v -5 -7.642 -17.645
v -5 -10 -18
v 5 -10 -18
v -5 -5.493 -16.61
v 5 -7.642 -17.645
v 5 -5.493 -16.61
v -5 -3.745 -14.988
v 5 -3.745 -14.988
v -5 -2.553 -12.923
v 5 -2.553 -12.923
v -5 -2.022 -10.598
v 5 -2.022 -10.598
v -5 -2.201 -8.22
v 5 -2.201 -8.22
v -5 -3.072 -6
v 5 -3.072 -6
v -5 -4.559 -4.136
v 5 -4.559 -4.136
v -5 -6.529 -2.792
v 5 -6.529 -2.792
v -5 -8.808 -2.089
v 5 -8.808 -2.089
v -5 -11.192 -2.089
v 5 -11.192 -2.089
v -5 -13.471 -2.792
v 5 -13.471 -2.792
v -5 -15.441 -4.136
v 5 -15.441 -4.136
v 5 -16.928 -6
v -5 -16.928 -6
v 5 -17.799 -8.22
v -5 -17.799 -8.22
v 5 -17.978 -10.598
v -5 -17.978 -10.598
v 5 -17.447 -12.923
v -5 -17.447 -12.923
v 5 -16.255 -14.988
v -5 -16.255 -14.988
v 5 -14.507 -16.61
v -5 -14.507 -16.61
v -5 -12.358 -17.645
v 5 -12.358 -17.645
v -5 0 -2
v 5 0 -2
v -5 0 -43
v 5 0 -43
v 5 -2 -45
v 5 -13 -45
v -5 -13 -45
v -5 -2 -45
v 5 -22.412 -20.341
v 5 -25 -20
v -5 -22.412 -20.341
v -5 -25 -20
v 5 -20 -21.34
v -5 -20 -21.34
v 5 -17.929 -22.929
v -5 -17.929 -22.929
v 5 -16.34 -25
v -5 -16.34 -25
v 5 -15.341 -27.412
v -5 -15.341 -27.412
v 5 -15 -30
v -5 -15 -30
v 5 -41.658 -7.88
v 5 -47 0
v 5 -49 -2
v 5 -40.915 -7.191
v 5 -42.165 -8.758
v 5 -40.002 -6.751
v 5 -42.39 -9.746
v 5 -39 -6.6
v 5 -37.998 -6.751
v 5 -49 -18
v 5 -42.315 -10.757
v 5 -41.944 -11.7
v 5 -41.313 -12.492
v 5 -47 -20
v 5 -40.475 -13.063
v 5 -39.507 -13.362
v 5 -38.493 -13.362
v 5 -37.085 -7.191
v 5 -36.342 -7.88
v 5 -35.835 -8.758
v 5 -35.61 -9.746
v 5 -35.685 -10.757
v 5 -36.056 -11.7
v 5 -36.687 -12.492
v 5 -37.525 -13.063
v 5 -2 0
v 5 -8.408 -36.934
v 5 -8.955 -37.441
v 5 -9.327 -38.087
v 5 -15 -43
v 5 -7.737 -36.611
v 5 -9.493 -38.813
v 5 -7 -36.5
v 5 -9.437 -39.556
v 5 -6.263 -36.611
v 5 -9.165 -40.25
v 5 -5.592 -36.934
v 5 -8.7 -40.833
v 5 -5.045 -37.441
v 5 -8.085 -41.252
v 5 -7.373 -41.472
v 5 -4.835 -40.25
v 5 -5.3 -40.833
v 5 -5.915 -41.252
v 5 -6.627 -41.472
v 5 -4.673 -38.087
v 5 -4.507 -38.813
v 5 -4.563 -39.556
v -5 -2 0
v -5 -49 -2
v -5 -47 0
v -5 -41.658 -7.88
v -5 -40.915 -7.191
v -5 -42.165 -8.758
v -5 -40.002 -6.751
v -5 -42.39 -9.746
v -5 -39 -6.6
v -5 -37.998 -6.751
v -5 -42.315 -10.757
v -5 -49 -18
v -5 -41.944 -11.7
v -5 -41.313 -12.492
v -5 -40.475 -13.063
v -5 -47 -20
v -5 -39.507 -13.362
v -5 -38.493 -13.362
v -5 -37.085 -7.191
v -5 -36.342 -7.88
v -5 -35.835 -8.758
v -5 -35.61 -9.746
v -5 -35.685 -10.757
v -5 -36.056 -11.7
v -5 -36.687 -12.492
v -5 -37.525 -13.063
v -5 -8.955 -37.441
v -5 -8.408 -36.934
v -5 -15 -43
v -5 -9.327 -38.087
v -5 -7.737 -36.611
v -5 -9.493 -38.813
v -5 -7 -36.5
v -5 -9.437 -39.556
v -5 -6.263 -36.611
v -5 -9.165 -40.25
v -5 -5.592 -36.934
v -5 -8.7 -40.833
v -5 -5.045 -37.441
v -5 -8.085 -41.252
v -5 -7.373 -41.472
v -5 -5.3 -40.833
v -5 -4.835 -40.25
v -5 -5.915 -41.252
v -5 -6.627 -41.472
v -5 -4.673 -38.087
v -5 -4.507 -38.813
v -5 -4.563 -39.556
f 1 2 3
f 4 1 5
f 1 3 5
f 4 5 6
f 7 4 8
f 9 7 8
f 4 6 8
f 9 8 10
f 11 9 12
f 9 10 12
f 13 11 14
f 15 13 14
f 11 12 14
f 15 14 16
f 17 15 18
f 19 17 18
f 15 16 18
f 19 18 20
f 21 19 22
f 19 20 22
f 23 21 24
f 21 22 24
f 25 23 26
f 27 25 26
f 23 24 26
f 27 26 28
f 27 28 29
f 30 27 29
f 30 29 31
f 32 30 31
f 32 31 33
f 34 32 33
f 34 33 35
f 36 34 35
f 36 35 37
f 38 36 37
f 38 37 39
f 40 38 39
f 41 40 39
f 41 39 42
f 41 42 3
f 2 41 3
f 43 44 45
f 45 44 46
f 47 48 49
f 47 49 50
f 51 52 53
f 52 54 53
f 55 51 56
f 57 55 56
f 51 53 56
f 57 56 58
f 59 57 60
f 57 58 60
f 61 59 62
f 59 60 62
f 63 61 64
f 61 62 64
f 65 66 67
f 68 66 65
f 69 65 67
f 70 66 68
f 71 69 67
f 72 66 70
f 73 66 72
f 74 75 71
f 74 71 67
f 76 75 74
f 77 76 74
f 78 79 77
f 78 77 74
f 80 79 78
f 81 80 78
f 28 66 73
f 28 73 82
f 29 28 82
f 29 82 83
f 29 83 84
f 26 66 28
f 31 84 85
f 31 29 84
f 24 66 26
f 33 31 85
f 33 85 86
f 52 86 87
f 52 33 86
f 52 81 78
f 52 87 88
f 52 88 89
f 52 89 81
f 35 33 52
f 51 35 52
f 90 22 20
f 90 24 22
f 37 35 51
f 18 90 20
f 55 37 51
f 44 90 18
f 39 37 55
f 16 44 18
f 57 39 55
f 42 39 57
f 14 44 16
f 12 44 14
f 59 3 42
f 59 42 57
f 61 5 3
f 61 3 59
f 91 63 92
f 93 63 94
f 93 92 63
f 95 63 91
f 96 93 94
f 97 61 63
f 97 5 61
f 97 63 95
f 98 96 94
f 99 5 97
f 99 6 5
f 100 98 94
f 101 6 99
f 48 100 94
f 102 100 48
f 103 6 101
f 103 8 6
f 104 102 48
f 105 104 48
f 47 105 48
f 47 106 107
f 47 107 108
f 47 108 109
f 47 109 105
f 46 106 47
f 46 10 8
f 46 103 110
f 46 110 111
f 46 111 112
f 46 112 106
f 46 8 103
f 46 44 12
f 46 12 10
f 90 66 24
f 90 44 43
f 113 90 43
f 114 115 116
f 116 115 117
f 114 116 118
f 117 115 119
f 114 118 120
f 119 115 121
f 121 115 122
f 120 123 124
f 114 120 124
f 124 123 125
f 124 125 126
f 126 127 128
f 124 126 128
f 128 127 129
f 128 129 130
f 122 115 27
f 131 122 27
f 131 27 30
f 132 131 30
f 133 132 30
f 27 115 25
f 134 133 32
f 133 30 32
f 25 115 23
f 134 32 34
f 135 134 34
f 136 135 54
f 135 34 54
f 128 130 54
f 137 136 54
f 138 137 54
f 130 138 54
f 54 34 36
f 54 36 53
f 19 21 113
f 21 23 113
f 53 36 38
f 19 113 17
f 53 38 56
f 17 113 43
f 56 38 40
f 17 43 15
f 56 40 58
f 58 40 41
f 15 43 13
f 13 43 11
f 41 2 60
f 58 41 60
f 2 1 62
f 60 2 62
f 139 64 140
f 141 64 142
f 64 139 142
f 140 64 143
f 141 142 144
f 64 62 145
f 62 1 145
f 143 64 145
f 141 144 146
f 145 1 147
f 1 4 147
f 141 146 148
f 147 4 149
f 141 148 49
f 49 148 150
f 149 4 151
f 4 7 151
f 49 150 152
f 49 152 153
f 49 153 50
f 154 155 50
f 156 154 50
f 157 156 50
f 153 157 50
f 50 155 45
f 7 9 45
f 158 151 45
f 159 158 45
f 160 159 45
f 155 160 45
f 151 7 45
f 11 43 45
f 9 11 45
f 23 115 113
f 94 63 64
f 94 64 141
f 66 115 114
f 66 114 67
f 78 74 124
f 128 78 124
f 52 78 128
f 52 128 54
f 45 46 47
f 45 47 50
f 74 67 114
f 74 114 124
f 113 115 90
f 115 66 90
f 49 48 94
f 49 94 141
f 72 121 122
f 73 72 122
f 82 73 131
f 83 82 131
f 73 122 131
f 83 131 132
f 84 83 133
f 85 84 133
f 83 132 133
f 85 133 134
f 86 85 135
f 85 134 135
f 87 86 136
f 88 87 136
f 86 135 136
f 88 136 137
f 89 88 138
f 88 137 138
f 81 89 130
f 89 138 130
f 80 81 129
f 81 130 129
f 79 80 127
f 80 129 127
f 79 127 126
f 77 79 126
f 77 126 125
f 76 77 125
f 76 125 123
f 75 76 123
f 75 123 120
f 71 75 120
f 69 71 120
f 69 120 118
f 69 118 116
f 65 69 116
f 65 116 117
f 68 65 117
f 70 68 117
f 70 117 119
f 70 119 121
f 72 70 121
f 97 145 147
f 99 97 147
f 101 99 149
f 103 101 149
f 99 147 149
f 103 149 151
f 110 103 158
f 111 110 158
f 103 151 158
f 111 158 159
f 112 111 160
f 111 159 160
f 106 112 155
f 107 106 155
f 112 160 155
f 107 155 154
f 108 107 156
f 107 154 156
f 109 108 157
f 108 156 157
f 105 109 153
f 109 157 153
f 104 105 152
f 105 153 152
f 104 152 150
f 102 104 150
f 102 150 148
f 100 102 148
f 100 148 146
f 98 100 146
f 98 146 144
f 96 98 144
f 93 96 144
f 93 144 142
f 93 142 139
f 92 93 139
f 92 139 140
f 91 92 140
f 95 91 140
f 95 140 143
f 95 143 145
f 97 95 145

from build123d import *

# Parameters (mm, degrees)
SKETCH1_W              = 45
SKETCH1_H              = 49
BOSS_EXTRUDE1_DEPTH    = 5
SKETCH2_W              = 25
SKETCH2_H              = 34
CUT_EXTRUDE1_DEPTH     = 68.275552766
SKETCH3_R              = 8
CUT_EXTRUDE2_DEPTH     = 68.275552766
M8X1_25_TAPPED_HOLE1_D = 6.8
M6X1_0_TAPPED_HOLE1_D  = 5
FILLET1_R              = 10
CHAMFER1_SIZE          = 2


with BuildPart() as part:
    # Sketch1 → Boss-Extrude1 (new, symmetric)
    with BuildSketch(Plane(origin=(0, 0, 0), x_dir=(0, 0, -1), z_dir=(1, 0, 0))):
        with Locations((22.5, -24.5)):
            Rectangle(SKETCH1_W, SKETCH1_H)
    extrude(amount=BOSS_EXTRUDE1_DEPTH, both=True)

    # Sketch2 → Cut-Extrude1 (cut, through all)
    with BuildSketch(Plane(origin=(5, 0, 0), x_dir=(0, 0, -1), z_dir=(1, 0, 0))):
        with Locations((32.5, -32)):
            Rectangle(SKETCH2_W, SKETCH2_H)
    extrude(amount=-CUT_EXTRUDE1_DEPTH, mode=Mode.SUBTRACT)

    # Sketch3 → Cut-Extrude2 (cut, through all)
    with BuildSketch(Plane(origin=(5, 0, 0), x_dir=(0, 0, -1), z_dir=(1, 0, 0))):
        with Locations((10, -10)):
            Circle(SKETCH3_R)
    extrude(amount=-CUT_EXTRUDE2_DEPTH, mode=Mode.SUBTRACT)

    # M8x1.25 Tapped Hole1 (through all)
    with Locations(Plane(origin=(5, 0, 0), x_dir=(0, 0, -1), z_dir=(1, 0, 0))):
        with Locations((10, -39)):
            Hole(M8X1_25_TAPPED_HOLE1_D / 2)

    # M6x1.0 Tapped Hole1 (through all)
    with Locations(Plane(origin=(5, 0, 0), x_dir=(0, 0, -1), z_dir=(1, 0, 0))):
        with Locations((39, -7)):
            Hole(M6X1_0_TAPPED_HOLE1_D / 2)

    # Fillet1
    fillet1_edges = [part.edges().sort_by_distance(p)[0] for p in [
        (0, -15, -20),
    ]]
    fillet(fillet1_edges, radius=FILLET1_R)

    # Chamfer1
    chamfer1_edges = [part.edges().sort_by_distance(p)[0] for p in [
        (0, -15, -45),
        (0, -49, -20),
        (0, 0, 0),
        (0, 0, -45),
        (0, -49, 0),
    ]]
    chamfer(chamfer1_edges, length=CHAMFER1_SIZE)


solid = part.part
